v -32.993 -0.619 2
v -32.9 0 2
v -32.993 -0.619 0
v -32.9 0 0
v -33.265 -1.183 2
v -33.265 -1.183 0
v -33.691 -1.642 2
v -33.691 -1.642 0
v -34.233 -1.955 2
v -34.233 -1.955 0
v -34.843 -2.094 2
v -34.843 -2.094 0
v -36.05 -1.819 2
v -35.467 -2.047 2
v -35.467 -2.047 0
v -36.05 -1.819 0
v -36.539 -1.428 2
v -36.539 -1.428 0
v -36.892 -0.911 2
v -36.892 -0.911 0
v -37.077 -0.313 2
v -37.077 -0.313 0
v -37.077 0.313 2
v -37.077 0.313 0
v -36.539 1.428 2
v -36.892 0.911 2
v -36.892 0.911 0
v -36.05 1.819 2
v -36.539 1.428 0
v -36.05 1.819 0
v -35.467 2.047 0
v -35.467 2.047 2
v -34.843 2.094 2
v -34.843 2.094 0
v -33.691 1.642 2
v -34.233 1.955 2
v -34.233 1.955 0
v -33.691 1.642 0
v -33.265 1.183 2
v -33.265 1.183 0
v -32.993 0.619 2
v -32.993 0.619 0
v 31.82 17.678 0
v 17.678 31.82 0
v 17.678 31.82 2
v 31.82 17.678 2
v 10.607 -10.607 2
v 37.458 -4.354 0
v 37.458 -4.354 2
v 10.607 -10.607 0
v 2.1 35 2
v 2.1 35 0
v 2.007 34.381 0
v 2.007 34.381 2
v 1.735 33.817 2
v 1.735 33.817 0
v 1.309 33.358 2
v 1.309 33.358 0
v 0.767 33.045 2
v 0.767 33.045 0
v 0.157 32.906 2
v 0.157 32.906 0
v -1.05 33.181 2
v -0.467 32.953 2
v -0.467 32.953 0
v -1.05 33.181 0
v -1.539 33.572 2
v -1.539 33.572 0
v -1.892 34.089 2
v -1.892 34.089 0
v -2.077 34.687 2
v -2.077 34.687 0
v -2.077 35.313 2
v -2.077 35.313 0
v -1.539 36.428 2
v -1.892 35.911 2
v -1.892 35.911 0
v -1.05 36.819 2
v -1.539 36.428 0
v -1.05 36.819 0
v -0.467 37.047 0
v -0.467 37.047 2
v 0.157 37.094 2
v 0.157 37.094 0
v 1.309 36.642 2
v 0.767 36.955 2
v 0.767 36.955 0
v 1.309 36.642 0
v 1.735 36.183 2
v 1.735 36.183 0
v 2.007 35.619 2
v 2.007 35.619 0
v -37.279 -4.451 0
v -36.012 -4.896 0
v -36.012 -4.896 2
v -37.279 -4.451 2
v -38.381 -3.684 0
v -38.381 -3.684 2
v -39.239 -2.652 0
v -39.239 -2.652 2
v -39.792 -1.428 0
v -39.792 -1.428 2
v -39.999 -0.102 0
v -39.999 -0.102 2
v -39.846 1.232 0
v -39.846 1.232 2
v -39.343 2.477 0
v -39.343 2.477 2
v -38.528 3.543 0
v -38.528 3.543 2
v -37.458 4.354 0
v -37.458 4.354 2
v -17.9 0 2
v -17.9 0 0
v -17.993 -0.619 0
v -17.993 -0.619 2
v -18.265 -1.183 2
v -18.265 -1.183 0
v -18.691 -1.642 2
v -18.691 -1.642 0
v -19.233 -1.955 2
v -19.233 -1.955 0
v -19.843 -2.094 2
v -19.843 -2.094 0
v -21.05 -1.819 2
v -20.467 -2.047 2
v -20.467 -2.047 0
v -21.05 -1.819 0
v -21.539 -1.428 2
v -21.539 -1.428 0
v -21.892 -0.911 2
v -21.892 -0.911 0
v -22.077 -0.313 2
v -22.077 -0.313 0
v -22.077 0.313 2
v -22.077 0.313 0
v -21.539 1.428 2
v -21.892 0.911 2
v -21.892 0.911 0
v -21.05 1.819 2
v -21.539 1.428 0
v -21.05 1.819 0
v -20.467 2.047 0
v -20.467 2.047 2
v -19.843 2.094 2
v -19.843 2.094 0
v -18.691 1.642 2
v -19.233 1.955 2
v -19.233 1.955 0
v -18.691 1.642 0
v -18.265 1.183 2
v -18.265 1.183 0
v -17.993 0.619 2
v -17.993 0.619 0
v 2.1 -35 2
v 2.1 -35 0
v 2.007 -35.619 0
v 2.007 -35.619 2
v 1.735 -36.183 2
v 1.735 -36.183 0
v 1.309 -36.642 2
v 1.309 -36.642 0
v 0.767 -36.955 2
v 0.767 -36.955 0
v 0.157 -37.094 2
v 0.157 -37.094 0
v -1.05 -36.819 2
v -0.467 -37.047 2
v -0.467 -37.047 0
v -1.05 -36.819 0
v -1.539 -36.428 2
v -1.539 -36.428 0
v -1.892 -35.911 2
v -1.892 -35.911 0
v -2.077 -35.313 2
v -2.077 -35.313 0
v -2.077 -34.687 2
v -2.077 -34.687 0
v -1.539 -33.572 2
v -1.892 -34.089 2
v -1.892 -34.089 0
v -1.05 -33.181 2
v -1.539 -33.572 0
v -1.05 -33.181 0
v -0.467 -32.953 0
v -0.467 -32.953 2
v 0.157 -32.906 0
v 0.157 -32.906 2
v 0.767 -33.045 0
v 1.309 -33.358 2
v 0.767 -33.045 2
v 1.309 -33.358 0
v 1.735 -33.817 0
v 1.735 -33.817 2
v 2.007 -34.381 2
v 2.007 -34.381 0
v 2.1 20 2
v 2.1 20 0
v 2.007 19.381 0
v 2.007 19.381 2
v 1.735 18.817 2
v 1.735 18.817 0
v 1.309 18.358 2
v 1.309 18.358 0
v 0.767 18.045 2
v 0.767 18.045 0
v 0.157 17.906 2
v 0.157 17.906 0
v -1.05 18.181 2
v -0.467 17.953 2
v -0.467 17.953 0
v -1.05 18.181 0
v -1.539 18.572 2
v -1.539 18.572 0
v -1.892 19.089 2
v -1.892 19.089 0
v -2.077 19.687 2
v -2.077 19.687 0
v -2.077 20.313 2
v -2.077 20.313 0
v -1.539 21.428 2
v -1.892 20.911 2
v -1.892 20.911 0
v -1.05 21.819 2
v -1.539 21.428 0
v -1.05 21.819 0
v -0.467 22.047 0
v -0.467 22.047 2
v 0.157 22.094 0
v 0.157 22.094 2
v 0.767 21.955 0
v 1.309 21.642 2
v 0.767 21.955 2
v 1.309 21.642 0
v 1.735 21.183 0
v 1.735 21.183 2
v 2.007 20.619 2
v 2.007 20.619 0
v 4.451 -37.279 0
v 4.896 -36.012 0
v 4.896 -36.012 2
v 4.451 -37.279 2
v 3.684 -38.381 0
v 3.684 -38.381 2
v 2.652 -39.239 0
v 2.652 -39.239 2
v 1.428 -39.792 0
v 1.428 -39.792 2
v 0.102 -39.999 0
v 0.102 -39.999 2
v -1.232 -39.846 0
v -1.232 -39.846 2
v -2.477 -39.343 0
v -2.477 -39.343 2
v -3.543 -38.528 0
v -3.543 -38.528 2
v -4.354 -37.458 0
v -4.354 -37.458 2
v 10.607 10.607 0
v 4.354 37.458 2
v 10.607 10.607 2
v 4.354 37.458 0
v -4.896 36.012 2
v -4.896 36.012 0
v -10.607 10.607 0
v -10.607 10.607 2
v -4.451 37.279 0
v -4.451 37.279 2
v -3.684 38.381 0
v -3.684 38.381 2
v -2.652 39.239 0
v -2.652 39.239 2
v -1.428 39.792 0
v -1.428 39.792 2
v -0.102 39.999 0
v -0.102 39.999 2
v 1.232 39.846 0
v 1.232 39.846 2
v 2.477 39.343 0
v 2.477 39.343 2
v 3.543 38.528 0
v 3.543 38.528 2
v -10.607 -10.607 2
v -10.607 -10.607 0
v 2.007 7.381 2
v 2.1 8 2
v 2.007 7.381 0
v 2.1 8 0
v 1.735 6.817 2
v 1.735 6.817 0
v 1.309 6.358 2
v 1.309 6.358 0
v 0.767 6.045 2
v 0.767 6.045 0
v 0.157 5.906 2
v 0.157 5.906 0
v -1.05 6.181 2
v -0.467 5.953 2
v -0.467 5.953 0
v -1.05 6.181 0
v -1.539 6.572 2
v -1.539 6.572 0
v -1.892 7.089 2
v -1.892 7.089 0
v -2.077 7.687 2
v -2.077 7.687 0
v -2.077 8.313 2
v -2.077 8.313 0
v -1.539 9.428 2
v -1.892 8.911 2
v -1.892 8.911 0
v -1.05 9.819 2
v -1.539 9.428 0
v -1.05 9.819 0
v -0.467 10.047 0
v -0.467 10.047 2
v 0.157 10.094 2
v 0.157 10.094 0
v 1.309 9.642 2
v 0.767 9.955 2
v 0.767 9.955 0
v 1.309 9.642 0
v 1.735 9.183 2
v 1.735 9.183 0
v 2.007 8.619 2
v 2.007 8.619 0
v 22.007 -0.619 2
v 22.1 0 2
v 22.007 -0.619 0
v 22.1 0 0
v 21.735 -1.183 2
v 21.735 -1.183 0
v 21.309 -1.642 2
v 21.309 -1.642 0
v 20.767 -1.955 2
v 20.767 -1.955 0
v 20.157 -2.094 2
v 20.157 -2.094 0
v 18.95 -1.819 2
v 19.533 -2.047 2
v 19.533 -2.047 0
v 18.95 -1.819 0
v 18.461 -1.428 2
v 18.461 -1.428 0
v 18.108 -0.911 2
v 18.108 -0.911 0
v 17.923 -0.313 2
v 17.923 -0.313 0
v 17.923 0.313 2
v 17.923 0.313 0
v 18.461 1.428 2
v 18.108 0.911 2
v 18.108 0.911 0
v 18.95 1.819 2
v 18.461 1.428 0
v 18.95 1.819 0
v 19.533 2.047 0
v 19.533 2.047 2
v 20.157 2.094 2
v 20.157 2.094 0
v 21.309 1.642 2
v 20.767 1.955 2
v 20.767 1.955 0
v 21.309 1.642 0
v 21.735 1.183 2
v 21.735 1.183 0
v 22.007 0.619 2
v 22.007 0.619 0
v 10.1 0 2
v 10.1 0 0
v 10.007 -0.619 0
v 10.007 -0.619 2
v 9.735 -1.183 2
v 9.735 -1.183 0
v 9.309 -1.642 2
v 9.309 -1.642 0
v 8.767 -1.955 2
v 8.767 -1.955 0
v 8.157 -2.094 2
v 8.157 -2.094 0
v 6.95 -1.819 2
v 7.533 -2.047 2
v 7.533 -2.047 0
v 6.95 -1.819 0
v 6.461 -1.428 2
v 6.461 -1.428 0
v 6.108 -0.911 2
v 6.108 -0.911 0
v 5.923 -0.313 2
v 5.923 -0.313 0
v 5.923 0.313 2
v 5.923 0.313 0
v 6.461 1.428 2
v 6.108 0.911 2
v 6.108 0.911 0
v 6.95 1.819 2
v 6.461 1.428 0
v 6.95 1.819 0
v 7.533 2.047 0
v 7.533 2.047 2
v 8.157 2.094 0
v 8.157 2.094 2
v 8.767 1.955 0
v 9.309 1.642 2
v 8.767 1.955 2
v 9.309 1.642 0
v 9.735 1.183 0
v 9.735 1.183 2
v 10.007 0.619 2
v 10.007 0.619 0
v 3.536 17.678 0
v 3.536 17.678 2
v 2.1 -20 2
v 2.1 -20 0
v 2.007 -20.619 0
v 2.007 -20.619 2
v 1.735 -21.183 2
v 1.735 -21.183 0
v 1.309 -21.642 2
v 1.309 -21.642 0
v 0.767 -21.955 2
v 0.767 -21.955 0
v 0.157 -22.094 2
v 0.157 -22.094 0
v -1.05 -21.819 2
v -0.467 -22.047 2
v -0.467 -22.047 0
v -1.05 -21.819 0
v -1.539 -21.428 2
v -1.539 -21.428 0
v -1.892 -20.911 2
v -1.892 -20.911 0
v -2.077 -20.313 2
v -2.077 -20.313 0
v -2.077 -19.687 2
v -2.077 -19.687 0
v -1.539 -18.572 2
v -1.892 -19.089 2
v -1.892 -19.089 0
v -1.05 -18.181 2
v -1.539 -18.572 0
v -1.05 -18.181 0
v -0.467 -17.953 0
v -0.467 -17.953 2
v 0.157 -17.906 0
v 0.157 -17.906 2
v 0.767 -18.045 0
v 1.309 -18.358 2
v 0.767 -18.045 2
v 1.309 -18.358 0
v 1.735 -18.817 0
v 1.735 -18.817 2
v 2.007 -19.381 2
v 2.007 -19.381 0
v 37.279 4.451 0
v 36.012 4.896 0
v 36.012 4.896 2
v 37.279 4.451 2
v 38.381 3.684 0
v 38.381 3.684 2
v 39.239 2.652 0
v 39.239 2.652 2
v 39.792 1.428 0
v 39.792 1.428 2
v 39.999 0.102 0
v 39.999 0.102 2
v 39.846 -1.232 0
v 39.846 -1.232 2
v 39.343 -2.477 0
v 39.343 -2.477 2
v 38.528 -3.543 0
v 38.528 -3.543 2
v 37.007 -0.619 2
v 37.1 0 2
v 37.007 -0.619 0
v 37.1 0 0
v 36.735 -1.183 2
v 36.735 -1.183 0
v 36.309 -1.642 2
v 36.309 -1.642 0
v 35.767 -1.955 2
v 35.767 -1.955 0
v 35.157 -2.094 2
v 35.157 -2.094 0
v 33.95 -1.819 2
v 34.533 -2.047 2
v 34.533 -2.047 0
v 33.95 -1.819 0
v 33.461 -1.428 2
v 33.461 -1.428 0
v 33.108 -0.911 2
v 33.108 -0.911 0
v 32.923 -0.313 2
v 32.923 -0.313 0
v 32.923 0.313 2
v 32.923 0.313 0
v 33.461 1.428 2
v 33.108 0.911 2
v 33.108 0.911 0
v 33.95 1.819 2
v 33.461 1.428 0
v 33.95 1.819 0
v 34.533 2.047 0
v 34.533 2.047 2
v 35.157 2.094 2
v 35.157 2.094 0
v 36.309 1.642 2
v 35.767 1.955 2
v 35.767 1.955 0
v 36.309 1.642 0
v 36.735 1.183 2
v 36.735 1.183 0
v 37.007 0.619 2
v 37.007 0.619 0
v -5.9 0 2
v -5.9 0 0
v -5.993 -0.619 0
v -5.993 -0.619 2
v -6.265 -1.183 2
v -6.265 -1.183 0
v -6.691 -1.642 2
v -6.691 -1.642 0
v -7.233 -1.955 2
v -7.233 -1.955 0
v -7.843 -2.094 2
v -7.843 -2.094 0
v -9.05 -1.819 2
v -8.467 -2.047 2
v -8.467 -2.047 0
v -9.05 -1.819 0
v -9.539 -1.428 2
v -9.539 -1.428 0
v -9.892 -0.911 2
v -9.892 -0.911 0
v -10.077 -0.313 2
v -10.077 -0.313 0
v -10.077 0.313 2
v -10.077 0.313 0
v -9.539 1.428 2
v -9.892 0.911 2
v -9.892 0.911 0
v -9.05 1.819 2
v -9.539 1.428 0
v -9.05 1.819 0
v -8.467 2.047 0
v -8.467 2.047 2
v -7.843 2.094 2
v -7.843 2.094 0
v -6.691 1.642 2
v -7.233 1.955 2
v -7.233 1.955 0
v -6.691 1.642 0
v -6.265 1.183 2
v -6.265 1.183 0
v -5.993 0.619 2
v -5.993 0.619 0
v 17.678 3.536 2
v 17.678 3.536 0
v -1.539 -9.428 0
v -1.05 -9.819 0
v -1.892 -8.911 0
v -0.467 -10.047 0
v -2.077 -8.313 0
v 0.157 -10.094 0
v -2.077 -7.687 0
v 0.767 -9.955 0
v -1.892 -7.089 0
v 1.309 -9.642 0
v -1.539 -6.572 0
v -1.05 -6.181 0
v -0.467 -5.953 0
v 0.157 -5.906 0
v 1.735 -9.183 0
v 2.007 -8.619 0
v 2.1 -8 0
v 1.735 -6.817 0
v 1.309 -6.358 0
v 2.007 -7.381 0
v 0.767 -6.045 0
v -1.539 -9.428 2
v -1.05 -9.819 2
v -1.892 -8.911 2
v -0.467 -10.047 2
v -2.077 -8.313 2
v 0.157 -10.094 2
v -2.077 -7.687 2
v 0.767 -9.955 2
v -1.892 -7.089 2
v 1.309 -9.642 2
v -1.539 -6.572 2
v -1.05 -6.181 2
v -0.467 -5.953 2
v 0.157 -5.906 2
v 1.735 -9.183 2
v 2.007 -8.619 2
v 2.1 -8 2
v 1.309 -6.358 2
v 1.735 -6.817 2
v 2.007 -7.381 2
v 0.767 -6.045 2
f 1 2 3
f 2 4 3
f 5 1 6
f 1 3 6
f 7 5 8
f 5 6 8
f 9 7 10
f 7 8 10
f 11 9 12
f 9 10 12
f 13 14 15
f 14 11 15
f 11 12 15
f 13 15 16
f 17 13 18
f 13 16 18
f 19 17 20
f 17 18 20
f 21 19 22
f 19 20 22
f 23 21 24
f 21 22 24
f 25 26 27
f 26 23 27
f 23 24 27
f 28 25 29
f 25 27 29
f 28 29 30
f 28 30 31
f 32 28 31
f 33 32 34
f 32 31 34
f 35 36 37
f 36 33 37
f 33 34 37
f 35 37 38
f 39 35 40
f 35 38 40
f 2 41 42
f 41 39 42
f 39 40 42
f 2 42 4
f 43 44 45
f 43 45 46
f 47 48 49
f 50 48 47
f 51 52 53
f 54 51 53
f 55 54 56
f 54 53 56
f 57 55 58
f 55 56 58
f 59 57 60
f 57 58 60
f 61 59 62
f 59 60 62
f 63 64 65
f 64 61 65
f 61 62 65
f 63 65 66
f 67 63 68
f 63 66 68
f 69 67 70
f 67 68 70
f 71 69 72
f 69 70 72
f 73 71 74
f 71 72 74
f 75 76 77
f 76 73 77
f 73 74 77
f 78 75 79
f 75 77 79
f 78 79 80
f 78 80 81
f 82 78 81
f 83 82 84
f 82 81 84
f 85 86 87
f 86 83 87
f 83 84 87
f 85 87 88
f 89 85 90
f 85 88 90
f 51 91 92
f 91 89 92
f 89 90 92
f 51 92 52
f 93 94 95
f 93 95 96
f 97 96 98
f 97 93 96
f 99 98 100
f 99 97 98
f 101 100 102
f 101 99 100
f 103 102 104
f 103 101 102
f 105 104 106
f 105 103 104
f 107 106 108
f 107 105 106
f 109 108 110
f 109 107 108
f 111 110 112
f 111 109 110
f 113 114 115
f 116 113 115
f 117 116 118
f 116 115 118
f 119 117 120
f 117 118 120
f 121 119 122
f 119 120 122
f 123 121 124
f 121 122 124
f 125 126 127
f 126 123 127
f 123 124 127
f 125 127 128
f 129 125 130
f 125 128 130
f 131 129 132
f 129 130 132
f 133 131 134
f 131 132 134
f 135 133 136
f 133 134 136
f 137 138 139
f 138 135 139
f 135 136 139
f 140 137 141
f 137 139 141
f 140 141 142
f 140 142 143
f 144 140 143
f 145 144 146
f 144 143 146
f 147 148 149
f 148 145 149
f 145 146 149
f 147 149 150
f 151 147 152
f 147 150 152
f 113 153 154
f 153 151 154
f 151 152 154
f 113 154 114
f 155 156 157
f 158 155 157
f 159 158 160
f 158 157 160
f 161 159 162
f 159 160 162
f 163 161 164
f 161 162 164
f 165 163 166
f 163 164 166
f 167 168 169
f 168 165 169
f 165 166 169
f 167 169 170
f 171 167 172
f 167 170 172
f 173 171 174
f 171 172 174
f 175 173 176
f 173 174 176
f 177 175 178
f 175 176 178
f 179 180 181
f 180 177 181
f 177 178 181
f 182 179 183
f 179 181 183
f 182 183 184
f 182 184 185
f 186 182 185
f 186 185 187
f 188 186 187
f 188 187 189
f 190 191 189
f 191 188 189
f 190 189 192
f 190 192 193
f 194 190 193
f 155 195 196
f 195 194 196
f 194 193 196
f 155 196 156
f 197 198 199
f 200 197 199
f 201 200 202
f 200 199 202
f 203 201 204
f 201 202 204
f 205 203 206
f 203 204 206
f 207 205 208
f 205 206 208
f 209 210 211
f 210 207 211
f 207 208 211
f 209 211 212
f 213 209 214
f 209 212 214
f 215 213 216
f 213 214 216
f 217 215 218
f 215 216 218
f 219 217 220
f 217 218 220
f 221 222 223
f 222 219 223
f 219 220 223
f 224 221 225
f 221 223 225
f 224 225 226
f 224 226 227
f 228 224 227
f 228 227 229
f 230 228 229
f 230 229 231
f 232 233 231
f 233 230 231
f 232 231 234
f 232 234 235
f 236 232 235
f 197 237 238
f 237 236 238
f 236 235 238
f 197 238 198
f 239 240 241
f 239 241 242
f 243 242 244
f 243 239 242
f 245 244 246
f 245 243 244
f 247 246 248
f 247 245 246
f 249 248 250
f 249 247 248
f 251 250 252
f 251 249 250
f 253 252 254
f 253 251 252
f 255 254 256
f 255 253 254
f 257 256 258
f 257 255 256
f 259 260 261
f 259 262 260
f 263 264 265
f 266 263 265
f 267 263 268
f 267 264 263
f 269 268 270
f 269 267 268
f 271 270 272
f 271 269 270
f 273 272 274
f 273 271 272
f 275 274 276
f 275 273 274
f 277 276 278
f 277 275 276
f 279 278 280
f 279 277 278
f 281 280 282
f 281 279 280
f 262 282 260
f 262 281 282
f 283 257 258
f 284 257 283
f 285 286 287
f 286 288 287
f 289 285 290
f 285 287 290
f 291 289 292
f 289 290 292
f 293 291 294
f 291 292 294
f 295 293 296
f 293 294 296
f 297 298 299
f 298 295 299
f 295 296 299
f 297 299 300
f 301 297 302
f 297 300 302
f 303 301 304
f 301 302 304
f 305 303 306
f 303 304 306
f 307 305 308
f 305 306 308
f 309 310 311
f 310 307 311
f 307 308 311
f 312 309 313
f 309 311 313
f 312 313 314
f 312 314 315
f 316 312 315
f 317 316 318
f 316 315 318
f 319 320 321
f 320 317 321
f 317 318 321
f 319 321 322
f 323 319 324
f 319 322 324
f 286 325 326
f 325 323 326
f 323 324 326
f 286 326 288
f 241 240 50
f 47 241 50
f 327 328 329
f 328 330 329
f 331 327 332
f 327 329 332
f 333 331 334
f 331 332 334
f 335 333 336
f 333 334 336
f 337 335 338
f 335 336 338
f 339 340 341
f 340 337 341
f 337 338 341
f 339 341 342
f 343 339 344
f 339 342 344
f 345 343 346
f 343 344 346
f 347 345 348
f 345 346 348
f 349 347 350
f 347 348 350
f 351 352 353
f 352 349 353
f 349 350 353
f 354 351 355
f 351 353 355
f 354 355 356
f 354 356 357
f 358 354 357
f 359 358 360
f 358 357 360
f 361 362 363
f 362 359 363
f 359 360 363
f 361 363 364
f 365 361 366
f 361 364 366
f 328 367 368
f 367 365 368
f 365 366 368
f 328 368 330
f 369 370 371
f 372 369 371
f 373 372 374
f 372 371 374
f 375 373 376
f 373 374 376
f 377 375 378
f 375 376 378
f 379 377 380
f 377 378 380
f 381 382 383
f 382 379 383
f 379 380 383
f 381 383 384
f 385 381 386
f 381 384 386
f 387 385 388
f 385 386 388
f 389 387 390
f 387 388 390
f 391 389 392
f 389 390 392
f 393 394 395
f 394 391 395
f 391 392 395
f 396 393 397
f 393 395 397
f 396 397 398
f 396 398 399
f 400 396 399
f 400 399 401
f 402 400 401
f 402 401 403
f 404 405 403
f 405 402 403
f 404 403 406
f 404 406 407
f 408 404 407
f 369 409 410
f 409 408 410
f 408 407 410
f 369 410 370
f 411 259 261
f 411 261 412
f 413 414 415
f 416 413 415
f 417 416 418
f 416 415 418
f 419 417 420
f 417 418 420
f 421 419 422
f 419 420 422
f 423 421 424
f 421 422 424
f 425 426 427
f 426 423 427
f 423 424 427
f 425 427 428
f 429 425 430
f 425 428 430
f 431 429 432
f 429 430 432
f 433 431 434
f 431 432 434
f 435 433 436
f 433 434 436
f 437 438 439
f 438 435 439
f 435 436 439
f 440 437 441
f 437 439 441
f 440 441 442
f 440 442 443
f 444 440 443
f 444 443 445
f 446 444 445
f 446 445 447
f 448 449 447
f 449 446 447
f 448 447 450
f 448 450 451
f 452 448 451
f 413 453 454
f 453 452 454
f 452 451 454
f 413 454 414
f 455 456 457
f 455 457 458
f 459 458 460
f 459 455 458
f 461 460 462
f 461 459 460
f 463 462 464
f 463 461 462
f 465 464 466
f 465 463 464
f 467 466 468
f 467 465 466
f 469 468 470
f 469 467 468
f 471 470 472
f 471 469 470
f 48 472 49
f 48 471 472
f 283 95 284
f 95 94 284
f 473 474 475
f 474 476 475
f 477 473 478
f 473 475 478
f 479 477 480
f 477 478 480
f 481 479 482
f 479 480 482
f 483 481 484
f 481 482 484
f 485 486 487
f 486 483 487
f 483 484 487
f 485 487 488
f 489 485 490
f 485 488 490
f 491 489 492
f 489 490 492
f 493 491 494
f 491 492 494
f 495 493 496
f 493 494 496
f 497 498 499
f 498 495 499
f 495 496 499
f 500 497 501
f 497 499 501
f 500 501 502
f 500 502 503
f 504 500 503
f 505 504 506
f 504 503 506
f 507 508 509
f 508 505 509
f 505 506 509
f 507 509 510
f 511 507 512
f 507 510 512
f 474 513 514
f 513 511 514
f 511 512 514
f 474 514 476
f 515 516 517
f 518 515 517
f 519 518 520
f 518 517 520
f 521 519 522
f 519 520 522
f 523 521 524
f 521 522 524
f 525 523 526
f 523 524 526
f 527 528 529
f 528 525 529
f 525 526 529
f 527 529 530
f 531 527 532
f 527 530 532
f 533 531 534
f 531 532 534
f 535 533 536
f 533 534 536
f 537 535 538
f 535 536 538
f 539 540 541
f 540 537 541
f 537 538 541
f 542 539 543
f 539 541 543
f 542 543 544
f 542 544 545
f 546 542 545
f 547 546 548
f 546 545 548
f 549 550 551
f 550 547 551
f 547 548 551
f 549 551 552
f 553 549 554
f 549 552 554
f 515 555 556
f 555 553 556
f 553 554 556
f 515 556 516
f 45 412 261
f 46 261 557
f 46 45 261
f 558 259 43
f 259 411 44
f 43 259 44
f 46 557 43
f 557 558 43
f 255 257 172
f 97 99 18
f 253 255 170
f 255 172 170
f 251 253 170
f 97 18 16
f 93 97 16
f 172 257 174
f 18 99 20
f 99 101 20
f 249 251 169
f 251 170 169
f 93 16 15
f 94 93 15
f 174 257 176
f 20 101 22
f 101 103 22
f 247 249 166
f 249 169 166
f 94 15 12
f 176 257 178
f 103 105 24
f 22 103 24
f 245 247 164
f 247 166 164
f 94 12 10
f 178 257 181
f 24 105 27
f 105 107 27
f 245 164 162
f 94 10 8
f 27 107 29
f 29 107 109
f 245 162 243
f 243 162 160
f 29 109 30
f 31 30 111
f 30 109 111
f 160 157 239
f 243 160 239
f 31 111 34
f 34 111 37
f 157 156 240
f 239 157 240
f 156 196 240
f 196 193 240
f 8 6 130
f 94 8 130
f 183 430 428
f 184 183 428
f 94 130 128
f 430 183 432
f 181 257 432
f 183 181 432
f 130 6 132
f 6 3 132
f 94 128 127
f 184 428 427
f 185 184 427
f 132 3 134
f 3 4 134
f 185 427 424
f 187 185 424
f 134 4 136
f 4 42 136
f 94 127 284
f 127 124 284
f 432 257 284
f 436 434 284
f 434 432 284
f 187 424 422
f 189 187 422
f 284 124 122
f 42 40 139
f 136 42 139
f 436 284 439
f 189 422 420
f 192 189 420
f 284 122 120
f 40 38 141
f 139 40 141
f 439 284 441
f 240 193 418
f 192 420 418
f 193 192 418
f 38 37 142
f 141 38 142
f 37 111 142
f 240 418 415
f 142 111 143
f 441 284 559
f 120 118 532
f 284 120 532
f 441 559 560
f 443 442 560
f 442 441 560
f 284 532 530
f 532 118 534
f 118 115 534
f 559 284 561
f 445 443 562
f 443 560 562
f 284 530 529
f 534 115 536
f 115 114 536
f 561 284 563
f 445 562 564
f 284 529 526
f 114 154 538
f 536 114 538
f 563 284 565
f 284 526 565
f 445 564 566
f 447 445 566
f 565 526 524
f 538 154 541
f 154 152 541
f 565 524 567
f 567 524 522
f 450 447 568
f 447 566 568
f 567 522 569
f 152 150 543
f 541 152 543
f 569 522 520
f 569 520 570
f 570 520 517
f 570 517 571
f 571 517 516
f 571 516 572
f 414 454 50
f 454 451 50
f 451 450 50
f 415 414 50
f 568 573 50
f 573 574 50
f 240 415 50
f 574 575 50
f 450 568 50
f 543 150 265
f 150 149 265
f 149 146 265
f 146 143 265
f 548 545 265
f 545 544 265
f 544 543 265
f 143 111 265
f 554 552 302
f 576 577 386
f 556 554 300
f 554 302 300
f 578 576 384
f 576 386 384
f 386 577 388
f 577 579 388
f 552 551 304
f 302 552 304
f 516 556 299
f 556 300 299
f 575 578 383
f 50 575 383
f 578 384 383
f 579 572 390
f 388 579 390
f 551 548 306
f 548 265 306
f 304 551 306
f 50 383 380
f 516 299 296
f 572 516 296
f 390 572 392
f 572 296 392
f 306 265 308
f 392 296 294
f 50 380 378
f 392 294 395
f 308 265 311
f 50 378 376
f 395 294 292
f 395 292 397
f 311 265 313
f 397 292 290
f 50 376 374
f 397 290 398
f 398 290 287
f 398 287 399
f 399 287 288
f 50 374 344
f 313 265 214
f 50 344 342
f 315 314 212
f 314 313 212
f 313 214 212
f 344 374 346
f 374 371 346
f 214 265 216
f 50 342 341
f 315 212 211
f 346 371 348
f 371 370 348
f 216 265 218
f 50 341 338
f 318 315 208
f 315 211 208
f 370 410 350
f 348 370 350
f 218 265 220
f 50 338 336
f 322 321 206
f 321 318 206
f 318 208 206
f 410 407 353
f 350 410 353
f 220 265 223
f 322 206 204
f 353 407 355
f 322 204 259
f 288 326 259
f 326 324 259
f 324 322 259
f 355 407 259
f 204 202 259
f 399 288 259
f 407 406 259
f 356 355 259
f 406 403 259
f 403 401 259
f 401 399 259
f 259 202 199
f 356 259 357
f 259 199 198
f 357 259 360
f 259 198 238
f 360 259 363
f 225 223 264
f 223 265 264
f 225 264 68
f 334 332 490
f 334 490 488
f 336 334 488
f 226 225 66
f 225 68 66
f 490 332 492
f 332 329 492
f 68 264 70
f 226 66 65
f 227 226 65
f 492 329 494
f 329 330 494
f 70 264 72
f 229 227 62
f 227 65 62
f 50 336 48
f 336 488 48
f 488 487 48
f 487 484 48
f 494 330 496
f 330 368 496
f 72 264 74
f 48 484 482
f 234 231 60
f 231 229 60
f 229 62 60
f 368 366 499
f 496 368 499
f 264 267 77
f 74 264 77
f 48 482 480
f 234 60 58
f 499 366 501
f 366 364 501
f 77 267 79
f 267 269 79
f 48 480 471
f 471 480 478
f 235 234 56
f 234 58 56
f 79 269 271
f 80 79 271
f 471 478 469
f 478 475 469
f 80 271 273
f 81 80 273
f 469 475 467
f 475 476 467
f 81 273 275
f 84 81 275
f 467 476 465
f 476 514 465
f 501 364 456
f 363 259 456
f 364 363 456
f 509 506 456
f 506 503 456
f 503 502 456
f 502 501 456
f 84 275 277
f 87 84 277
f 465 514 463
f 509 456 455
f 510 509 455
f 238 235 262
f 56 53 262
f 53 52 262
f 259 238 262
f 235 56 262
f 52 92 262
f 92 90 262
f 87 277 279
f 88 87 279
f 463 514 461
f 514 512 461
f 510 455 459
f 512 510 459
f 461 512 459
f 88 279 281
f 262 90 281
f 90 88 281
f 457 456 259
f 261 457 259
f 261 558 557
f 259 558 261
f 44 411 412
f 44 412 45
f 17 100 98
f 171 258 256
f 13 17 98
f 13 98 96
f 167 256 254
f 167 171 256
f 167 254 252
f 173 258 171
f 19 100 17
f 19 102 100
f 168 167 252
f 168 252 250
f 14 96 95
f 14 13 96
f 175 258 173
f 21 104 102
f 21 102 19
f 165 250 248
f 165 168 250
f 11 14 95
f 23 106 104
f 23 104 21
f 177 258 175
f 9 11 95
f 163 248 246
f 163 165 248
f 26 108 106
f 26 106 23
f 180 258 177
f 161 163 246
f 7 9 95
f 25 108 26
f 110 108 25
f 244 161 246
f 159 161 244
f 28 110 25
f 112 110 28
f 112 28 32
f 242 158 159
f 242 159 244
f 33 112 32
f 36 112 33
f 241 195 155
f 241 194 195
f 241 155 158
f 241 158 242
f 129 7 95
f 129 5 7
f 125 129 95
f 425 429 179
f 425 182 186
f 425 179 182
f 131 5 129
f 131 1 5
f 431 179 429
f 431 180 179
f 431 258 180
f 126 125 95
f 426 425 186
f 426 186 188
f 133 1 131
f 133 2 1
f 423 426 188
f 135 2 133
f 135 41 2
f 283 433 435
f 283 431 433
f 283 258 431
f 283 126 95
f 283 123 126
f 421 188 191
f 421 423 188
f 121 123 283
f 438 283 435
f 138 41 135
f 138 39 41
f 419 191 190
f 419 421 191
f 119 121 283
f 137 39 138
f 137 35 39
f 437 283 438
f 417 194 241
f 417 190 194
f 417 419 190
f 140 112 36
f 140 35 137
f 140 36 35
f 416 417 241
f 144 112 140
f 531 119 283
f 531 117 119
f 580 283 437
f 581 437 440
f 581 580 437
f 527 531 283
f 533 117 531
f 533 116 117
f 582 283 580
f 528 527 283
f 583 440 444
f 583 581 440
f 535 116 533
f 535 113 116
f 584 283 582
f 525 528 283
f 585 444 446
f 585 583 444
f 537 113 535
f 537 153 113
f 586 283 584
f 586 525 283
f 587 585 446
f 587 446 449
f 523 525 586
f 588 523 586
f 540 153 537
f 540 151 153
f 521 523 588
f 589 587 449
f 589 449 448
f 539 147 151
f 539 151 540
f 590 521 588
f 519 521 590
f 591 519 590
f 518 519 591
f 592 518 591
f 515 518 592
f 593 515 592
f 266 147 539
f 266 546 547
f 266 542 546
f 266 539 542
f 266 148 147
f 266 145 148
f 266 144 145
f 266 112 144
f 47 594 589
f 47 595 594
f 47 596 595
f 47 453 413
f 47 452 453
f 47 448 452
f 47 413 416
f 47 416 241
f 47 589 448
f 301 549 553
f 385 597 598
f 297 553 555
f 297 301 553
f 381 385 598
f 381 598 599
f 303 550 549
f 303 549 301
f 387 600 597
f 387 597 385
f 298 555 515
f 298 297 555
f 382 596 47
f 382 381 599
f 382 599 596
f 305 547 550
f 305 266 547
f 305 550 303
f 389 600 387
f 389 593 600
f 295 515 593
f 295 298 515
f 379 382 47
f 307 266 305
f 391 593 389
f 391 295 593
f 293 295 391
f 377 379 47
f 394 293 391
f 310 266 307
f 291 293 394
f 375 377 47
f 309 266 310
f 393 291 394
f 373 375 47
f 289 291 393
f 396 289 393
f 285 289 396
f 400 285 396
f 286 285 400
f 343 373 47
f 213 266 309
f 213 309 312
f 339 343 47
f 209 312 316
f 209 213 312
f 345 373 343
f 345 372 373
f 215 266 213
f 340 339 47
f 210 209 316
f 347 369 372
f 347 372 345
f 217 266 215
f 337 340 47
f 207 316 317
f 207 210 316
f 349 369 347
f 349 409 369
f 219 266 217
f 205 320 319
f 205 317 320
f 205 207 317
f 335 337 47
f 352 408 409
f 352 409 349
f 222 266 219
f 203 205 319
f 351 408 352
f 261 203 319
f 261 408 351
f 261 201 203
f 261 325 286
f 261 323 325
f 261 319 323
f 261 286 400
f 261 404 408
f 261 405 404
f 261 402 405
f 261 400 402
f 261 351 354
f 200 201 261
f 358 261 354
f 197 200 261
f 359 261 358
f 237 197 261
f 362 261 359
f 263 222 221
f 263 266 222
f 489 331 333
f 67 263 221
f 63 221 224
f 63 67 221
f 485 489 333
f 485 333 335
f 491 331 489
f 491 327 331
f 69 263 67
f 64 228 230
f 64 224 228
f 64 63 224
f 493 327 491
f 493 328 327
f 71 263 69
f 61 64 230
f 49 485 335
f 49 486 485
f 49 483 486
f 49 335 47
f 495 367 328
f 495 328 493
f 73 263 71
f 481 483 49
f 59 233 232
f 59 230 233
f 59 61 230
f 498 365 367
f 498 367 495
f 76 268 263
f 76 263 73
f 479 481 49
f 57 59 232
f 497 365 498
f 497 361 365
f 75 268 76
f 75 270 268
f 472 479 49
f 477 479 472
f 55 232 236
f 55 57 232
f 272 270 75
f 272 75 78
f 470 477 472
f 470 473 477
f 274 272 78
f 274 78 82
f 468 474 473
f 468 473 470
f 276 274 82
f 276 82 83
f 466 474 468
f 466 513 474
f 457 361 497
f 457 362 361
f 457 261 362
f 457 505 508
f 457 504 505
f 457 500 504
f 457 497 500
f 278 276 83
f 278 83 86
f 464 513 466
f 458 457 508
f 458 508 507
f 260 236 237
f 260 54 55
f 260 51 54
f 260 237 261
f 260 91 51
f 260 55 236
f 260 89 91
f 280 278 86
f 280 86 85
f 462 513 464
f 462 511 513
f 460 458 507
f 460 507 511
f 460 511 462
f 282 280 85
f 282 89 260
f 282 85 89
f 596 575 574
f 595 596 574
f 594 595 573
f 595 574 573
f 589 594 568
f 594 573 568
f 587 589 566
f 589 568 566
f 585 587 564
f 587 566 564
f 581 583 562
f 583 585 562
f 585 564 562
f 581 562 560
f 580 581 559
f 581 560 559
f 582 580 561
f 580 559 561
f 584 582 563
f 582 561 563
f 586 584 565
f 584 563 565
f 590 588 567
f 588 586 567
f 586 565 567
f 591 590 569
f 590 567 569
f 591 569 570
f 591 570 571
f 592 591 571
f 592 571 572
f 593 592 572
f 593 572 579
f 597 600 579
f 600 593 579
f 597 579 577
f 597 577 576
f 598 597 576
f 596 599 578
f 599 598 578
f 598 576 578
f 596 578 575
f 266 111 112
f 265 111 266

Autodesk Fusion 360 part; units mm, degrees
sketch "Frame" plane through (0, 0, 0) normal (0, 0, 1) x (1, 0, 0)
  circle A0 centre (0, 0) radius 35 construction
  circle A1 centre (0, 0) radius 8 construction
  line L0 (0, 0) -> (0, 2.9787)
  line L1 (0, 2.9787) -> (0, 35) construction
  circle A2 centre (0, 8) radius 2.1
  circle A3 centre (0, 0) radius 11 construction
  circle A4 centre (0, 0) radius 20 construction
  circle A5 centre (0, 35) radius 2.1
  circle A6 centre (0, 20) radius 2.1
  circle A7 centre (0, 35) radius 5
  line L2 (0, 0) -> (24.7487, 24.7487) construction
  line L3 (0, 0) -> (35, 0) construction
  line L4 (0, 21.2132) -> (-21.2132, 0) construction
  line L5 (-21.2132, 0) -> (0, -21.2132) construction
  line L6 (0, -21.2132) -> (21.2132, 0) construction
  line L7 (21.2132, 0) -> (0, 21.2132) construction
  line L8 (-4.8965, 36.0123) -> (-10.6066, 10.6066)
  line L9 (4.354, 37.4581) -> (10.6066, 10.6066)
  line L10 (-37.4581, 4.354) -> (-10.6066, 10.6066)
  line L11 (-36.0123, -4.8965) -> (-10.6066, -10.6066)
  circle A8 centre (-35, 0) radius 5
  circle A9 centre (-35, 0) radius 2.1
  circle A10 centre (-20, 0) radius 2.1
  circle A11 centre (-8, 0) radius 2.1
  line L12 (-4.354, -37.4581) -> (-10.6066, -10.6066)
  line L13 (4.8965, -36.0123) -> (10.6066, -10.6066)
  circle A12 centre (0, -35) radius 5
  circle A13 centre (0, -35) radius 2.1
  circle A14 centre (0, -20) radius 2.1
  circle A15 centre (0, -8) radius 2.1
  line L14 (37.4581, -4.354) -> (10.6066, -10.6066)
  line L15 (36.0123, 4.8965) -> (10.6066, 10.6066)
  circle A16 centre (35, 0) radius 5
  circle A17 centre (35, 0) radius 2.1
  circle A18 centre (20, 0) radius 2.1
  circle A19 centre (8, 0) radius 2.1
  dimension "d1" = 70
  dimension "d2" = 16
  dimension "d3" = 4.2
  dimension "d4" = 22
  dimension "d5" = 40
  dimension "d6" = 4.2
  dimension "d7" = 4.2
  dimension "d8" = 10
  dimension "d10" = 45
  dimension "d11" = 15
  dimension "d13" = 360
sketch "Wire Rest" plane through (0, 0, 0) normal (0, 0, 1) x (1, 0, 0)
  line L0 (21.2132, 0) -> (0, 21.2132)
  line L1 (10.6066, 10.6066) -> (3.5355, 17.6777)
  line L2 (10.6066, 10.6066) -> (17.6777, 3.5355)
  line L3 (3.5355, 17.6777) -> (17.6777, 31.8198)
  line L4 (17.6777, 3.5355) -> (31.8198, 17.6777)
  line L5 (17.6777, 31.8198) -> (31.8198, 17.6777)
  dimension "d14" = 10
  dimension "d15" = 10
  dimension "d16" = 20
  dimension "d18" = 20
extrude "Extrude1" add sketch "Frame" along normal blind 2 contours A7 L9 | A7 L8 L9 L10 L11 A8 L12 L13 A12 L14 L15 A16 | L14 A16 | L10 A8 | L12 A12 picked at (3.7843, 35.9318) picked at (35.8812, -3.7978) picked at (-35.8812, 3.7978) picked at (-3.7843, -35.9318) makes body 1
extrude "Extrude2" add sketch "Wire Rest" along normal blind 2 separate body makes body 2
